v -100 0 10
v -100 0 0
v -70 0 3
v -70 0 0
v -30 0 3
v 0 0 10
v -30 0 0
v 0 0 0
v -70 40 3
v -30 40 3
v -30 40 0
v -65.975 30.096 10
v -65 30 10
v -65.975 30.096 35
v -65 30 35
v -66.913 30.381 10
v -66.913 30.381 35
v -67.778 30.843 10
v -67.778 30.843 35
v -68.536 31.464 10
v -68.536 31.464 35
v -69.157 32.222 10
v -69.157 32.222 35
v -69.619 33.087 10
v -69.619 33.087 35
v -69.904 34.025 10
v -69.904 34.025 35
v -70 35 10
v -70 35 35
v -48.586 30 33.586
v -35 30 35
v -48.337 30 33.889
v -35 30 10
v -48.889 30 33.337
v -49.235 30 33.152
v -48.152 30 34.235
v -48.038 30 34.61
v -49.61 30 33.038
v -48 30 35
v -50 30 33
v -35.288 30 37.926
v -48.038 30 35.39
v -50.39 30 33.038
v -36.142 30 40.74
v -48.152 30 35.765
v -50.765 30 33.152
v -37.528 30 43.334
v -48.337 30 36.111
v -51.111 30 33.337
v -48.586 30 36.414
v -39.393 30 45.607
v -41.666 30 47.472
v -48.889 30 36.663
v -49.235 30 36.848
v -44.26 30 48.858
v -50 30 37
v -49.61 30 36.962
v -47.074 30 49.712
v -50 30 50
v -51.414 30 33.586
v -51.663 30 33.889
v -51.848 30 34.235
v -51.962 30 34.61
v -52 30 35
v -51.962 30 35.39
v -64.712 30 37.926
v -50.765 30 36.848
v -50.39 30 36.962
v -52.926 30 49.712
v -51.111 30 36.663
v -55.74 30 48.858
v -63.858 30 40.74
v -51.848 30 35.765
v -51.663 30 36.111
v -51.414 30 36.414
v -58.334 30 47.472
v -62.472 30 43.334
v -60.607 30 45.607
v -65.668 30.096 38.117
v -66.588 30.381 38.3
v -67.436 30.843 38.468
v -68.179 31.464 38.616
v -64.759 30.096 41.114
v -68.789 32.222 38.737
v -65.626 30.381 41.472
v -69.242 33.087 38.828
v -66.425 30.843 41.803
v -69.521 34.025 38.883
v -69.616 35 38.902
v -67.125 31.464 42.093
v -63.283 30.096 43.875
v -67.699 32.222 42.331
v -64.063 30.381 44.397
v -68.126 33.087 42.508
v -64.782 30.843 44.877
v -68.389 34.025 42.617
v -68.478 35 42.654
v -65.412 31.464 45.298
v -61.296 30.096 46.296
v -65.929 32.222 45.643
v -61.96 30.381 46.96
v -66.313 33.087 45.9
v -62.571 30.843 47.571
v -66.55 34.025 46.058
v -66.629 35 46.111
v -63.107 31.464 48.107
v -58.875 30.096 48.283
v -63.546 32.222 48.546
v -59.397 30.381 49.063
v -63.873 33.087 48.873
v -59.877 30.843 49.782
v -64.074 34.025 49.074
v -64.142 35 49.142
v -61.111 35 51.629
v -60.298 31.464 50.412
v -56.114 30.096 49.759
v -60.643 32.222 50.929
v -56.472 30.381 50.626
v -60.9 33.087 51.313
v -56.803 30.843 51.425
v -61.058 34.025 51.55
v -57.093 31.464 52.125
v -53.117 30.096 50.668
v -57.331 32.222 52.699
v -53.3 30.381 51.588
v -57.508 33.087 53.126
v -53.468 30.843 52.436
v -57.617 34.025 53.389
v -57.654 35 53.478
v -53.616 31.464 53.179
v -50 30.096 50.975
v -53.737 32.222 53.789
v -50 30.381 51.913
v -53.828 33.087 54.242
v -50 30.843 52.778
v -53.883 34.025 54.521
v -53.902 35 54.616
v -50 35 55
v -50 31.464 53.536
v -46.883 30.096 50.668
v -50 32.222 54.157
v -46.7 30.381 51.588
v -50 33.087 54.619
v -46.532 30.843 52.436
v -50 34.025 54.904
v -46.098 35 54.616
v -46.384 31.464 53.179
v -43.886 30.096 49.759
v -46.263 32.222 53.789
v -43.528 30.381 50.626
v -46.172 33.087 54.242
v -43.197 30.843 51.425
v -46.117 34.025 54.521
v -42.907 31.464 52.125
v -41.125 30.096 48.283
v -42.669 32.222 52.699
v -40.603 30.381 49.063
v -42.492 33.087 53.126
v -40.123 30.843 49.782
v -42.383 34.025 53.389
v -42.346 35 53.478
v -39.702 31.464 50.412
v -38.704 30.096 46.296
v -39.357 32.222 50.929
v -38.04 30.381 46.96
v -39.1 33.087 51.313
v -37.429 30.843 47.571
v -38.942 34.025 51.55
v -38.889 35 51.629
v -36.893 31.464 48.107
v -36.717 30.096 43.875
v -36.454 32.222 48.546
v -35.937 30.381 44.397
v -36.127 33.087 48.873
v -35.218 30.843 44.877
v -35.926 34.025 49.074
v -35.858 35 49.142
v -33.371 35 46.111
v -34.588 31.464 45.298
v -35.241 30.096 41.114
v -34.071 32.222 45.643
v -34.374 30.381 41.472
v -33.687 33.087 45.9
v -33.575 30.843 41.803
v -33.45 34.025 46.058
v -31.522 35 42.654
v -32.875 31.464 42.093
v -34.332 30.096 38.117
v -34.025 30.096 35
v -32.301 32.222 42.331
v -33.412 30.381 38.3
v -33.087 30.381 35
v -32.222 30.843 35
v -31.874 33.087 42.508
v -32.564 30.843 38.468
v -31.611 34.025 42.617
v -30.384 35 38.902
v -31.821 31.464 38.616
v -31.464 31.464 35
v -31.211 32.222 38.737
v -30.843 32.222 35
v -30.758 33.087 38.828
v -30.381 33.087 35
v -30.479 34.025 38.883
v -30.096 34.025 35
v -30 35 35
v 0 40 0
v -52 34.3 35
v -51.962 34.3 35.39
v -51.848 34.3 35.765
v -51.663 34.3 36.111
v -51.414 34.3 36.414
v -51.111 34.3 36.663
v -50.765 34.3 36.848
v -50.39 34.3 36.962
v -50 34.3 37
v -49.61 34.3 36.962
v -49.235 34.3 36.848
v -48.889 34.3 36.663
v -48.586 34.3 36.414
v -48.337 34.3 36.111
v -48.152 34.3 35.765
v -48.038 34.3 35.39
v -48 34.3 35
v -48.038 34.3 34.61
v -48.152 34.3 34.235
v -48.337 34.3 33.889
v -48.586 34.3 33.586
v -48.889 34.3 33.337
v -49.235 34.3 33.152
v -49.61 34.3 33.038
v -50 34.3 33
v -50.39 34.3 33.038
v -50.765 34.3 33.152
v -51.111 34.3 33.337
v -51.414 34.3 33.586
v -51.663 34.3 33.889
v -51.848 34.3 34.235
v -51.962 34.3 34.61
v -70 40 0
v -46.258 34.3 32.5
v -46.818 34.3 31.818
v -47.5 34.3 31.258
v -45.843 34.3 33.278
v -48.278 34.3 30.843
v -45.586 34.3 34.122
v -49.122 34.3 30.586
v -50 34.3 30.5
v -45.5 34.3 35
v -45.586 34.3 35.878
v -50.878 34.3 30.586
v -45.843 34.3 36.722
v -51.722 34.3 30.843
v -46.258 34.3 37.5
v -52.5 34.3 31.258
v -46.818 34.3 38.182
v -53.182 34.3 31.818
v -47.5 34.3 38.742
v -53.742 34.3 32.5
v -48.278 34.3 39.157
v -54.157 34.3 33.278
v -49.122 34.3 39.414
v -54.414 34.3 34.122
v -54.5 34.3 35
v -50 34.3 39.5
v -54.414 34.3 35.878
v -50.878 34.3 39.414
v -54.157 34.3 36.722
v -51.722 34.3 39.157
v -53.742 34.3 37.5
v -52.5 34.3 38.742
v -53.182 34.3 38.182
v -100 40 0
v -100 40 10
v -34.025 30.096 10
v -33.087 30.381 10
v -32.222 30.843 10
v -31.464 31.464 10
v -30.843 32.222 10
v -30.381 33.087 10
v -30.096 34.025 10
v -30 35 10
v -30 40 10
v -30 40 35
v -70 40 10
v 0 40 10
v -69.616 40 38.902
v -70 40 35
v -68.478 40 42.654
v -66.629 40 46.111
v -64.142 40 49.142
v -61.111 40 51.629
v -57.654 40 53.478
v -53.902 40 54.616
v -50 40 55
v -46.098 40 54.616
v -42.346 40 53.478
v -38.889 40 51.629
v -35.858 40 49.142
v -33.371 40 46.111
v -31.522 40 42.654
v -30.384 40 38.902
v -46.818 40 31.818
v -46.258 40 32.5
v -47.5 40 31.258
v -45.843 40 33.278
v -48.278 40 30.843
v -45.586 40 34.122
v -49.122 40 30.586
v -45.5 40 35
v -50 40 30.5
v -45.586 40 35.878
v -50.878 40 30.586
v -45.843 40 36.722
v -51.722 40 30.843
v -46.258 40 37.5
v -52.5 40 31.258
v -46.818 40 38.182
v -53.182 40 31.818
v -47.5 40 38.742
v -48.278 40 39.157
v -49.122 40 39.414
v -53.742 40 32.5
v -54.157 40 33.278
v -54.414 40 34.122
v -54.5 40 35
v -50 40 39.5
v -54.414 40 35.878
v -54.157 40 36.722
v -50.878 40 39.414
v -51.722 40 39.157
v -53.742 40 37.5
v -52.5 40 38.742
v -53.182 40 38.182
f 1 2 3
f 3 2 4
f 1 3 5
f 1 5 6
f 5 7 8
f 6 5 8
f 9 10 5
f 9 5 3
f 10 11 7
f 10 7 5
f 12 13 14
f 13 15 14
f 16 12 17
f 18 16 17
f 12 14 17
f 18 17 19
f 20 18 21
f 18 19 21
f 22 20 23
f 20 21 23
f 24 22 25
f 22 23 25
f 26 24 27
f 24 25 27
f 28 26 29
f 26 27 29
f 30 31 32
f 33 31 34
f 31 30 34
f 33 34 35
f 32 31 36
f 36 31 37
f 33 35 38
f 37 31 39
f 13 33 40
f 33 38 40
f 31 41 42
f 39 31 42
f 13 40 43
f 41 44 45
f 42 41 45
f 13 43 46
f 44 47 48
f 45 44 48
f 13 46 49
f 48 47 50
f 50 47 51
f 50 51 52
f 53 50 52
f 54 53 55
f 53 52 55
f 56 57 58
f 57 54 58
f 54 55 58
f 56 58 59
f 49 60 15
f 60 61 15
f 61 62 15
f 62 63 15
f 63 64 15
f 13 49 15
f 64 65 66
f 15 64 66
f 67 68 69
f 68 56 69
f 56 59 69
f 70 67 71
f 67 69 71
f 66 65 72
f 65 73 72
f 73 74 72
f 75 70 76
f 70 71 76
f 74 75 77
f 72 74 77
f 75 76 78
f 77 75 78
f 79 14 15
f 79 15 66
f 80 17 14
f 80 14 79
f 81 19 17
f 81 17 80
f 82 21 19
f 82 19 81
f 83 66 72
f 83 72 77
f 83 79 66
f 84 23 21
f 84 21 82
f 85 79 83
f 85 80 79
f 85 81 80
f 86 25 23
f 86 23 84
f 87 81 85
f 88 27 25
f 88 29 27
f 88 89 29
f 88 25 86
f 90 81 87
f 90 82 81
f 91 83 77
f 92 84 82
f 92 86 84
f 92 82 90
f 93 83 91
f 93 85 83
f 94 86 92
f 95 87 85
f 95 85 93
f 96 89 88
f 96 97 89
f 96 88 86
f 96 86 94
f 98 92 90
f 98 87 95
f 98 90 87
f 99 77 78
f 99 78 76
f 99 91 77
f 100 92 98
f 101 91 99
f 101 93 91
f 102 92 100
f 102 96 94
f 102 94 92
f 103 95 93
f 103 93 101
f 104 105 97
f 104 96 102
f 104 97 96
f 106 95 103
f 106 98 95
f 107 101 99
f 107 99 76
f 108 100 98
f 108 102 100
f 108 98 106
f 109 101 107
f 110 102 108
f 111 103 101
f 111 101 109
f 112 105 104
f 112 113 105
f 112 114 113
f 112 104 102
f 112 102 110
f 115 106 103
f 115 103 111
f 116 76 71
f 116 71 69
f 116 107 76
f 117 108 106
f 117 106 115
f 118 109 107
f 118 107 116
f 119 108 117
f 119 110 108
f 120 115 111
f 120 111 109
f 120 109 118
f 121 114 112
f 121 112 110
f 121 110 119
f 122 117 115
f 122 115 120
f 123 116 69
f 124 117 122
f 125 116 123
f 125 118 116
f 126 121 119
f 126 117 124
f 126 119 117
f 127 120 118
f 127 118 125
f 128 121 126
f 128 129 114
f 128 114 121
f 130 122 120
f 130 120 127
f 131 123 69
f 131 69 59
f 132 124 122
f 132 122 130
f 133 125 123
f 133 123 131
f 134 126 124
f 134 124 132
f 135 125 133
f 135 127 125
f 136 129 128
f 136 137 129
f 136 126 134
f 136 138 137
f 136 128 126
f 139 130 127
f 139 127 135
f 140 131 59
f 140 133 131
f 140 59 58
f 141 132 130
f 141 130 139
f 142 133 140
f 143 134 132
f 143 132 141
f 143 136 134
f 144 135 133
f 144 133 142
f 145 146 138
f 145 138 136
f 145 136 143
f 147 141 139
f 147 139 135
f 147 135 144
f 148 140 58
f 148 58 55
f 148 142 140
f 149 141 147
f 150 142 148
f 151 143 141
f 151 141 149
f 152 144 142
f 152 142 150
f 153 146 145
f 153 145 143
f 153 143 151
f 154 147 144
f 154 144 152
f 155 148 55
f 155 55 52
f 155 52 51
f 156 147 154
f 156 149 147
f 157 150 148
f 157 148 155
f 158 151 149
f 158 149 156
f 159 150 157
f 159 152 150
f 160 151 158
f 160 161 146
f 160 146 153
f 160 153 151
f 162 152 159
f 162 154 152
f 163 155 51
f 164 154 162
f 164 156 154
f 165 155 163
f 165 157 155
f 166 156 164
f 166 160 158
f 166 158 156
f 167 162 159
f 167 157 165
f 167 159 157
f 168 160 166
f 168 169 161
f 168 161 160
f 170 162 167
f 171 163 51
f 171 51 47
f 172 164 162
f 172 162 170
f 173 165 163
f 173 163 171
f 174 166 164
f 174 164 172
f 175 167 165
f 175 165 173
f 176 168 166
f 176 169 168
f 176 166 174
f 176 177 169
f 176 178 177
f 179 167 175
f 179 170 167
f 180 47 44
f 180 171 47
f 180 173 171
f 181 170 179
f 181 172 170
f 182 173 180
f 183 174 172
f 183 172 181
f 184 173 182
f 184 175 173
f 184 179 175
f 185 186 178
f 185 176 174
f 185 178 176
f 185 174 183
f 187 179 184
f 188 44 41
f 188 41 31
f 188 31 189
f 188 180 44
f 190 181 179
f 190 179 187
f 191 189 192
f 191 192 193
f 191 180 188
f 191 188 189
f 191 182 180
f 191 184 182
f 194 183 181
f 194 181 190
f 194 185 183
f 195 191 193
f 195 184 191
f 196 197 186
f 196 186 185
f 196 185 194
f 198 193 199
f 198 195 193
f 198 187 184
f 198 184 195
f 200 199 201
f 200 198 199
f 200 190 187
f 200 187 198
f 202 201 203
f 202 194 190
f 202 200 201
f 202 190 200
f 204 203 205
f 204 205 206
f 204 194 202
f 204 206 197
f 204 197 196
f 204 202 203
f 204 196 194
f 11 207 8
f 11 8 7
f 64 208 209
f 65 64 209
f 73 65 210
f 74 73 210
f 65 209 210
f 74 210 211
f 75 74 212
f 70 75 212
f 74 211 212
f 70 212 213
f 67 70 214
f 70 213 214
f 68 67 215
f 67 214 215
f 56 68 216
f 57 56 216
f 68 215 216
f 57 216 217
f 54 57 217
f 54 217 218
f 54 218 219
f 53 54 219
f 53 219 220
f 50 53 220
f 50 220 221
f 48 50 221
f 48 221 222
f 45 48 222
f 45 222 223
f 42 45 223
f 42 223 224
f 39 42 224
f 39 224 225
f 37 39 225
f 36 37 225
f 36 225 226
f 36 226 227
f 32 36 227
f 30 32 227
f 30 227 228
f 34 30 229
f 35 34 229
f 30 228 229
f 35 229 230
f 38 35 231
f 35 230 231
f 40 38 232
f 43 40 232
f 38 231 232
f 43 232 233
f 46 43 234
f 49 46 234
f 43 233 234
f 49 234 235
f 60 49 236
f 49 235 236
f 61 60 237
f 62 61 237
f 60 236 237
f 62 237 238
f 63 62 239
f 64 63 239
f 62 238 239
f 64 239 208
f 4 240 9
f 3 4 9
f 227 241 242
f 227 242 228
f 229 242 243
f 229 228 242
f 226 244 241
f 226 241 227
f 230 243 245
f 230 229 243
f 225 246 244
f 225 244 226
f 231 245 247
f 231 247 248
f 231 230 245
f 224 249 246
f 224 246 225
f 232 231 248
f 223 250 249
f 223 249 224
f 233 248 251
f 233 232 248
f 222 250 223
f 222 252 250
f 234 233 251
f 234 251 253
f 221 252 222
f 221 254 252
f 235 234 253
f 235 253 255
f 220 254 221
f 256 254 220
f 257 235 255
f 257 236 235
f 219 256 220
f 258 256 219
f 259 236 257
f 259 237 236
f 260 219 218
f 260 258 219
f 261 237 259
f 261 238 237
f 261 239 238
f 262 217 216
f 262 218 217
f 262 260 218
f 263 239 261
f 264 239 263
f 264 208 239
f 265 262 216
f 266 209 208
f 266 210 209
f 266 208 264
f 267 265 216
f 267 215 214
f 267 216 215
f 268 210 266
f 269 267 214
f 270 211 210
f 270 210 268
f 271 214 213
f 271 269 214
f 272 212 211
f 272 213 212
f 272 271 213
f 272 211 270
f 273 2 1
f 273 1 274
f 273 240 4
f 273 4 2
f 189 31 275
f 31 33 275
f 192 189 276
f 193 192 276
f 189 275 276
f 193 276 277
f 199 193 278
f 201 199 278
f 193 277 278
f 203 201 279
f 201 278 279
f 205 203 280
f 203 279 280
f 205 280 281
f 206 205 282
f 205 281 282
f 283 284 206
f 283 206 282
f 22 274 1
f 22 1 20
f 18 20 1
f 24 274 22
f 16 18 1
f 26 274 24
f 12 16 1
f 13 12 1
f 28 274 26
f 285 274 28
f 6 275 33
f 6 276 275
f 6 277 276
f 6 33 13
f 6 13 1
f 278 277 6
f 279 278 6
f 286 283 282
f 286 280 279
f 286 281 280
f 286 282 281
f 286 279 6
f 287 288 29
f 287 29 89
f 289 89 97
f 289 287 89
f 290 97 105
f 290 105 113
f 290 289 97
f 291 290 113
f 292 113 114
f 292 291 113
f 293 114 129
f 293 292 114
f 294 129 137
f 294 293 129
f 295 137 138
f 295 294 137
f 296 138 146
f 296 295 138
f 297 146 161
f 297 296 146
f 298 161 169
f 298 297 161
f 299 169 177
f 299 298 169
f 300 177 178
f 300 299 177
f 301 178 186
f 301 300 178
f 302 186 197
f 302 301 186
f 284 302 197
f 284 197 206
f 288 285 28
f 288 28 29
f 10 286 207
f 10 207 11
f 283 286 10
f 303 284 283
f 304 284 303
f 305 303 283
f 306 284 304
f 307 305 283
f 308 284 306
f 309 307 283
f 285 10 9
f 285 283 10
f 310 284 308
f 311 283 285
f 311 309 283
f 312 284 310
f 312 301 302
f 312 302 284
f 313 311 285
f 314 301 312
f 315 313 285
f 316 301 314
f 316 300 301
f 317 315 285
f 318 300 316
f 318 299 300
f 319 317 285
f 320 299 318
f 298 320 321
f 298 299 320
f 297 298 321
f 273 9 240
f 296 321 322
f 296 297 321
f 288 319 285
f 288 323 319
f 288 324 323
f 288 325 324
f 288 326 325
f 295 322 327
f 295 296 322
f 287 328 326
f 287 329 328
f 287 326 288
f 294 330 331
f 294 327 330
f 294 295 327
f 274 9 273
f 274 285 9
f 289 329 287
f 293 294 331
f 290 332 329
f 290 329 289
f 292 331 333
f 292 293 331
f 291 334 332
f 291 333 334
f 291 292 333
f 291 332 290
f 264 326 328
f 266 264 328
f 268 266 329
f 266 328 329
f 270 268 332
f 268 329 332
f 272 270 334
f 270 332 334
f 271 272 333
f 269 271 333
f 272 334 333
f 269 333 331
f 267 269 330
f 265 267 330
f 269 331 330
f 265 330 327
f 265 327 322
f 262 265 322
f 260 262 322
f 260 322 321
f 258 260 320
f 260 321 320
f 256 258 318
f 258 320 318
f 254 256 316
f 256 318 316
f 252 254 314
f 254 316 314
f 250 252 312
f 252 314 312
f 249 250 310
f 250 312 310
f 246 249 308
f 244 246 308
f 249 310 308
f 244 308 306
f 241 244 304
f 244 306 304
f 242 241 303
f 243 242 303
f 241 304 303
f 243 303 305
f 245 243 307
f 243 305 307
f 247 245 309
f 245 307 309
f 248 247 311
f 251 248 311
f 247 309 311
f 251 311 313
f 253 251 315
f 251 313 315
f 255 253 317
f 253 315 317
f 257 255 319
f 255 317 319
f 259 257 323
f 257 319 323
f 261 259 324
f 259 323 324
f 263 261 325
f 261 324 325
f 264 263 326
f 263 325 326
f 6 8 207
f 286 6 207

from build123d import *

# Parameters (mm, degrees)
F0_W     = 100
F0_H     = 40
F1_DEPTH = 10
F3_DEPTH = 10
F4_R     = 2
F5_DEPTH = 25
F6_R     = 4.5
F7_DEPTH = 5.7
F8_W     = 40
F8_H     = 3
F9_DEPTH = 40.001
F10_R    = 5


with BuildPart() as f1:
    # F0 (on Top) → F1 (new body)
    with BuildSketch(Plane.XY):
        with Locations((-50, 20)):
            Rectangle(F0_W, F0_H)
    extrude(amount=F1_DEPTH)

    # F2 (on face) → F3 (join)
    with BuildSketch(Plane(origin=(0, 40, 0), x_dir=(-1, 0, 0), z_dir=(0, 1, 0))):
        with BuildLine():
            Line((30, 35), (30, 0))
            Line((30, 0), (70, 0))
            Line((70, 0), (70, 35))
            ThreePointArc((70, 35), (50, 55), (30, 35))
        make_face()
    extrude(amount=-F3_DEPTH)

    # F4 (on face) → F5 (cut)
    with BuildSketch(Plane(origin=(0, 40, 0), x_dir=(-1, 0, 0), z_dir=(0, 1, 0))):
        with Locations((50, 35)):
            Circle(F4_R)
    extrude(amount=-F5_DEPTH, mode=Mode.SUBTRACT)

    # F6 (on face) → F7 (cut)
    with BuildSketch(Plane(origin=(0, 40, 0), x_dir=(-1, 0, 0), z_dir=(0, 1, 0))):
        with Locations((50, 35)):
            Circle(F6_R)
    extrude(amount=-F7_DEPTH, mode=Mode.SUBTRACT)

    # F8 (on face) → F9 (cut, through all)
    with BuildSketch(Plane(origin=(0, 40, 0), x_dir=(-1, 0, 0), z_dir=(0, 1, 0))):
        with Locations((50, 1.5)):
            Rectangle(F8_W, F8_H)
    extrude(amount=-F9_DEPTH, mode=Mode.SUBTRACT)

    # F10
    f10_edges = [f1.edges().sort_by_distance(p)[0] for p in [
        (-70, 30, 22.5),
        (-30, 30, 22.5),
    ]]
    fillet(f10_edges, radius=F10_R)


solid = f1.part
